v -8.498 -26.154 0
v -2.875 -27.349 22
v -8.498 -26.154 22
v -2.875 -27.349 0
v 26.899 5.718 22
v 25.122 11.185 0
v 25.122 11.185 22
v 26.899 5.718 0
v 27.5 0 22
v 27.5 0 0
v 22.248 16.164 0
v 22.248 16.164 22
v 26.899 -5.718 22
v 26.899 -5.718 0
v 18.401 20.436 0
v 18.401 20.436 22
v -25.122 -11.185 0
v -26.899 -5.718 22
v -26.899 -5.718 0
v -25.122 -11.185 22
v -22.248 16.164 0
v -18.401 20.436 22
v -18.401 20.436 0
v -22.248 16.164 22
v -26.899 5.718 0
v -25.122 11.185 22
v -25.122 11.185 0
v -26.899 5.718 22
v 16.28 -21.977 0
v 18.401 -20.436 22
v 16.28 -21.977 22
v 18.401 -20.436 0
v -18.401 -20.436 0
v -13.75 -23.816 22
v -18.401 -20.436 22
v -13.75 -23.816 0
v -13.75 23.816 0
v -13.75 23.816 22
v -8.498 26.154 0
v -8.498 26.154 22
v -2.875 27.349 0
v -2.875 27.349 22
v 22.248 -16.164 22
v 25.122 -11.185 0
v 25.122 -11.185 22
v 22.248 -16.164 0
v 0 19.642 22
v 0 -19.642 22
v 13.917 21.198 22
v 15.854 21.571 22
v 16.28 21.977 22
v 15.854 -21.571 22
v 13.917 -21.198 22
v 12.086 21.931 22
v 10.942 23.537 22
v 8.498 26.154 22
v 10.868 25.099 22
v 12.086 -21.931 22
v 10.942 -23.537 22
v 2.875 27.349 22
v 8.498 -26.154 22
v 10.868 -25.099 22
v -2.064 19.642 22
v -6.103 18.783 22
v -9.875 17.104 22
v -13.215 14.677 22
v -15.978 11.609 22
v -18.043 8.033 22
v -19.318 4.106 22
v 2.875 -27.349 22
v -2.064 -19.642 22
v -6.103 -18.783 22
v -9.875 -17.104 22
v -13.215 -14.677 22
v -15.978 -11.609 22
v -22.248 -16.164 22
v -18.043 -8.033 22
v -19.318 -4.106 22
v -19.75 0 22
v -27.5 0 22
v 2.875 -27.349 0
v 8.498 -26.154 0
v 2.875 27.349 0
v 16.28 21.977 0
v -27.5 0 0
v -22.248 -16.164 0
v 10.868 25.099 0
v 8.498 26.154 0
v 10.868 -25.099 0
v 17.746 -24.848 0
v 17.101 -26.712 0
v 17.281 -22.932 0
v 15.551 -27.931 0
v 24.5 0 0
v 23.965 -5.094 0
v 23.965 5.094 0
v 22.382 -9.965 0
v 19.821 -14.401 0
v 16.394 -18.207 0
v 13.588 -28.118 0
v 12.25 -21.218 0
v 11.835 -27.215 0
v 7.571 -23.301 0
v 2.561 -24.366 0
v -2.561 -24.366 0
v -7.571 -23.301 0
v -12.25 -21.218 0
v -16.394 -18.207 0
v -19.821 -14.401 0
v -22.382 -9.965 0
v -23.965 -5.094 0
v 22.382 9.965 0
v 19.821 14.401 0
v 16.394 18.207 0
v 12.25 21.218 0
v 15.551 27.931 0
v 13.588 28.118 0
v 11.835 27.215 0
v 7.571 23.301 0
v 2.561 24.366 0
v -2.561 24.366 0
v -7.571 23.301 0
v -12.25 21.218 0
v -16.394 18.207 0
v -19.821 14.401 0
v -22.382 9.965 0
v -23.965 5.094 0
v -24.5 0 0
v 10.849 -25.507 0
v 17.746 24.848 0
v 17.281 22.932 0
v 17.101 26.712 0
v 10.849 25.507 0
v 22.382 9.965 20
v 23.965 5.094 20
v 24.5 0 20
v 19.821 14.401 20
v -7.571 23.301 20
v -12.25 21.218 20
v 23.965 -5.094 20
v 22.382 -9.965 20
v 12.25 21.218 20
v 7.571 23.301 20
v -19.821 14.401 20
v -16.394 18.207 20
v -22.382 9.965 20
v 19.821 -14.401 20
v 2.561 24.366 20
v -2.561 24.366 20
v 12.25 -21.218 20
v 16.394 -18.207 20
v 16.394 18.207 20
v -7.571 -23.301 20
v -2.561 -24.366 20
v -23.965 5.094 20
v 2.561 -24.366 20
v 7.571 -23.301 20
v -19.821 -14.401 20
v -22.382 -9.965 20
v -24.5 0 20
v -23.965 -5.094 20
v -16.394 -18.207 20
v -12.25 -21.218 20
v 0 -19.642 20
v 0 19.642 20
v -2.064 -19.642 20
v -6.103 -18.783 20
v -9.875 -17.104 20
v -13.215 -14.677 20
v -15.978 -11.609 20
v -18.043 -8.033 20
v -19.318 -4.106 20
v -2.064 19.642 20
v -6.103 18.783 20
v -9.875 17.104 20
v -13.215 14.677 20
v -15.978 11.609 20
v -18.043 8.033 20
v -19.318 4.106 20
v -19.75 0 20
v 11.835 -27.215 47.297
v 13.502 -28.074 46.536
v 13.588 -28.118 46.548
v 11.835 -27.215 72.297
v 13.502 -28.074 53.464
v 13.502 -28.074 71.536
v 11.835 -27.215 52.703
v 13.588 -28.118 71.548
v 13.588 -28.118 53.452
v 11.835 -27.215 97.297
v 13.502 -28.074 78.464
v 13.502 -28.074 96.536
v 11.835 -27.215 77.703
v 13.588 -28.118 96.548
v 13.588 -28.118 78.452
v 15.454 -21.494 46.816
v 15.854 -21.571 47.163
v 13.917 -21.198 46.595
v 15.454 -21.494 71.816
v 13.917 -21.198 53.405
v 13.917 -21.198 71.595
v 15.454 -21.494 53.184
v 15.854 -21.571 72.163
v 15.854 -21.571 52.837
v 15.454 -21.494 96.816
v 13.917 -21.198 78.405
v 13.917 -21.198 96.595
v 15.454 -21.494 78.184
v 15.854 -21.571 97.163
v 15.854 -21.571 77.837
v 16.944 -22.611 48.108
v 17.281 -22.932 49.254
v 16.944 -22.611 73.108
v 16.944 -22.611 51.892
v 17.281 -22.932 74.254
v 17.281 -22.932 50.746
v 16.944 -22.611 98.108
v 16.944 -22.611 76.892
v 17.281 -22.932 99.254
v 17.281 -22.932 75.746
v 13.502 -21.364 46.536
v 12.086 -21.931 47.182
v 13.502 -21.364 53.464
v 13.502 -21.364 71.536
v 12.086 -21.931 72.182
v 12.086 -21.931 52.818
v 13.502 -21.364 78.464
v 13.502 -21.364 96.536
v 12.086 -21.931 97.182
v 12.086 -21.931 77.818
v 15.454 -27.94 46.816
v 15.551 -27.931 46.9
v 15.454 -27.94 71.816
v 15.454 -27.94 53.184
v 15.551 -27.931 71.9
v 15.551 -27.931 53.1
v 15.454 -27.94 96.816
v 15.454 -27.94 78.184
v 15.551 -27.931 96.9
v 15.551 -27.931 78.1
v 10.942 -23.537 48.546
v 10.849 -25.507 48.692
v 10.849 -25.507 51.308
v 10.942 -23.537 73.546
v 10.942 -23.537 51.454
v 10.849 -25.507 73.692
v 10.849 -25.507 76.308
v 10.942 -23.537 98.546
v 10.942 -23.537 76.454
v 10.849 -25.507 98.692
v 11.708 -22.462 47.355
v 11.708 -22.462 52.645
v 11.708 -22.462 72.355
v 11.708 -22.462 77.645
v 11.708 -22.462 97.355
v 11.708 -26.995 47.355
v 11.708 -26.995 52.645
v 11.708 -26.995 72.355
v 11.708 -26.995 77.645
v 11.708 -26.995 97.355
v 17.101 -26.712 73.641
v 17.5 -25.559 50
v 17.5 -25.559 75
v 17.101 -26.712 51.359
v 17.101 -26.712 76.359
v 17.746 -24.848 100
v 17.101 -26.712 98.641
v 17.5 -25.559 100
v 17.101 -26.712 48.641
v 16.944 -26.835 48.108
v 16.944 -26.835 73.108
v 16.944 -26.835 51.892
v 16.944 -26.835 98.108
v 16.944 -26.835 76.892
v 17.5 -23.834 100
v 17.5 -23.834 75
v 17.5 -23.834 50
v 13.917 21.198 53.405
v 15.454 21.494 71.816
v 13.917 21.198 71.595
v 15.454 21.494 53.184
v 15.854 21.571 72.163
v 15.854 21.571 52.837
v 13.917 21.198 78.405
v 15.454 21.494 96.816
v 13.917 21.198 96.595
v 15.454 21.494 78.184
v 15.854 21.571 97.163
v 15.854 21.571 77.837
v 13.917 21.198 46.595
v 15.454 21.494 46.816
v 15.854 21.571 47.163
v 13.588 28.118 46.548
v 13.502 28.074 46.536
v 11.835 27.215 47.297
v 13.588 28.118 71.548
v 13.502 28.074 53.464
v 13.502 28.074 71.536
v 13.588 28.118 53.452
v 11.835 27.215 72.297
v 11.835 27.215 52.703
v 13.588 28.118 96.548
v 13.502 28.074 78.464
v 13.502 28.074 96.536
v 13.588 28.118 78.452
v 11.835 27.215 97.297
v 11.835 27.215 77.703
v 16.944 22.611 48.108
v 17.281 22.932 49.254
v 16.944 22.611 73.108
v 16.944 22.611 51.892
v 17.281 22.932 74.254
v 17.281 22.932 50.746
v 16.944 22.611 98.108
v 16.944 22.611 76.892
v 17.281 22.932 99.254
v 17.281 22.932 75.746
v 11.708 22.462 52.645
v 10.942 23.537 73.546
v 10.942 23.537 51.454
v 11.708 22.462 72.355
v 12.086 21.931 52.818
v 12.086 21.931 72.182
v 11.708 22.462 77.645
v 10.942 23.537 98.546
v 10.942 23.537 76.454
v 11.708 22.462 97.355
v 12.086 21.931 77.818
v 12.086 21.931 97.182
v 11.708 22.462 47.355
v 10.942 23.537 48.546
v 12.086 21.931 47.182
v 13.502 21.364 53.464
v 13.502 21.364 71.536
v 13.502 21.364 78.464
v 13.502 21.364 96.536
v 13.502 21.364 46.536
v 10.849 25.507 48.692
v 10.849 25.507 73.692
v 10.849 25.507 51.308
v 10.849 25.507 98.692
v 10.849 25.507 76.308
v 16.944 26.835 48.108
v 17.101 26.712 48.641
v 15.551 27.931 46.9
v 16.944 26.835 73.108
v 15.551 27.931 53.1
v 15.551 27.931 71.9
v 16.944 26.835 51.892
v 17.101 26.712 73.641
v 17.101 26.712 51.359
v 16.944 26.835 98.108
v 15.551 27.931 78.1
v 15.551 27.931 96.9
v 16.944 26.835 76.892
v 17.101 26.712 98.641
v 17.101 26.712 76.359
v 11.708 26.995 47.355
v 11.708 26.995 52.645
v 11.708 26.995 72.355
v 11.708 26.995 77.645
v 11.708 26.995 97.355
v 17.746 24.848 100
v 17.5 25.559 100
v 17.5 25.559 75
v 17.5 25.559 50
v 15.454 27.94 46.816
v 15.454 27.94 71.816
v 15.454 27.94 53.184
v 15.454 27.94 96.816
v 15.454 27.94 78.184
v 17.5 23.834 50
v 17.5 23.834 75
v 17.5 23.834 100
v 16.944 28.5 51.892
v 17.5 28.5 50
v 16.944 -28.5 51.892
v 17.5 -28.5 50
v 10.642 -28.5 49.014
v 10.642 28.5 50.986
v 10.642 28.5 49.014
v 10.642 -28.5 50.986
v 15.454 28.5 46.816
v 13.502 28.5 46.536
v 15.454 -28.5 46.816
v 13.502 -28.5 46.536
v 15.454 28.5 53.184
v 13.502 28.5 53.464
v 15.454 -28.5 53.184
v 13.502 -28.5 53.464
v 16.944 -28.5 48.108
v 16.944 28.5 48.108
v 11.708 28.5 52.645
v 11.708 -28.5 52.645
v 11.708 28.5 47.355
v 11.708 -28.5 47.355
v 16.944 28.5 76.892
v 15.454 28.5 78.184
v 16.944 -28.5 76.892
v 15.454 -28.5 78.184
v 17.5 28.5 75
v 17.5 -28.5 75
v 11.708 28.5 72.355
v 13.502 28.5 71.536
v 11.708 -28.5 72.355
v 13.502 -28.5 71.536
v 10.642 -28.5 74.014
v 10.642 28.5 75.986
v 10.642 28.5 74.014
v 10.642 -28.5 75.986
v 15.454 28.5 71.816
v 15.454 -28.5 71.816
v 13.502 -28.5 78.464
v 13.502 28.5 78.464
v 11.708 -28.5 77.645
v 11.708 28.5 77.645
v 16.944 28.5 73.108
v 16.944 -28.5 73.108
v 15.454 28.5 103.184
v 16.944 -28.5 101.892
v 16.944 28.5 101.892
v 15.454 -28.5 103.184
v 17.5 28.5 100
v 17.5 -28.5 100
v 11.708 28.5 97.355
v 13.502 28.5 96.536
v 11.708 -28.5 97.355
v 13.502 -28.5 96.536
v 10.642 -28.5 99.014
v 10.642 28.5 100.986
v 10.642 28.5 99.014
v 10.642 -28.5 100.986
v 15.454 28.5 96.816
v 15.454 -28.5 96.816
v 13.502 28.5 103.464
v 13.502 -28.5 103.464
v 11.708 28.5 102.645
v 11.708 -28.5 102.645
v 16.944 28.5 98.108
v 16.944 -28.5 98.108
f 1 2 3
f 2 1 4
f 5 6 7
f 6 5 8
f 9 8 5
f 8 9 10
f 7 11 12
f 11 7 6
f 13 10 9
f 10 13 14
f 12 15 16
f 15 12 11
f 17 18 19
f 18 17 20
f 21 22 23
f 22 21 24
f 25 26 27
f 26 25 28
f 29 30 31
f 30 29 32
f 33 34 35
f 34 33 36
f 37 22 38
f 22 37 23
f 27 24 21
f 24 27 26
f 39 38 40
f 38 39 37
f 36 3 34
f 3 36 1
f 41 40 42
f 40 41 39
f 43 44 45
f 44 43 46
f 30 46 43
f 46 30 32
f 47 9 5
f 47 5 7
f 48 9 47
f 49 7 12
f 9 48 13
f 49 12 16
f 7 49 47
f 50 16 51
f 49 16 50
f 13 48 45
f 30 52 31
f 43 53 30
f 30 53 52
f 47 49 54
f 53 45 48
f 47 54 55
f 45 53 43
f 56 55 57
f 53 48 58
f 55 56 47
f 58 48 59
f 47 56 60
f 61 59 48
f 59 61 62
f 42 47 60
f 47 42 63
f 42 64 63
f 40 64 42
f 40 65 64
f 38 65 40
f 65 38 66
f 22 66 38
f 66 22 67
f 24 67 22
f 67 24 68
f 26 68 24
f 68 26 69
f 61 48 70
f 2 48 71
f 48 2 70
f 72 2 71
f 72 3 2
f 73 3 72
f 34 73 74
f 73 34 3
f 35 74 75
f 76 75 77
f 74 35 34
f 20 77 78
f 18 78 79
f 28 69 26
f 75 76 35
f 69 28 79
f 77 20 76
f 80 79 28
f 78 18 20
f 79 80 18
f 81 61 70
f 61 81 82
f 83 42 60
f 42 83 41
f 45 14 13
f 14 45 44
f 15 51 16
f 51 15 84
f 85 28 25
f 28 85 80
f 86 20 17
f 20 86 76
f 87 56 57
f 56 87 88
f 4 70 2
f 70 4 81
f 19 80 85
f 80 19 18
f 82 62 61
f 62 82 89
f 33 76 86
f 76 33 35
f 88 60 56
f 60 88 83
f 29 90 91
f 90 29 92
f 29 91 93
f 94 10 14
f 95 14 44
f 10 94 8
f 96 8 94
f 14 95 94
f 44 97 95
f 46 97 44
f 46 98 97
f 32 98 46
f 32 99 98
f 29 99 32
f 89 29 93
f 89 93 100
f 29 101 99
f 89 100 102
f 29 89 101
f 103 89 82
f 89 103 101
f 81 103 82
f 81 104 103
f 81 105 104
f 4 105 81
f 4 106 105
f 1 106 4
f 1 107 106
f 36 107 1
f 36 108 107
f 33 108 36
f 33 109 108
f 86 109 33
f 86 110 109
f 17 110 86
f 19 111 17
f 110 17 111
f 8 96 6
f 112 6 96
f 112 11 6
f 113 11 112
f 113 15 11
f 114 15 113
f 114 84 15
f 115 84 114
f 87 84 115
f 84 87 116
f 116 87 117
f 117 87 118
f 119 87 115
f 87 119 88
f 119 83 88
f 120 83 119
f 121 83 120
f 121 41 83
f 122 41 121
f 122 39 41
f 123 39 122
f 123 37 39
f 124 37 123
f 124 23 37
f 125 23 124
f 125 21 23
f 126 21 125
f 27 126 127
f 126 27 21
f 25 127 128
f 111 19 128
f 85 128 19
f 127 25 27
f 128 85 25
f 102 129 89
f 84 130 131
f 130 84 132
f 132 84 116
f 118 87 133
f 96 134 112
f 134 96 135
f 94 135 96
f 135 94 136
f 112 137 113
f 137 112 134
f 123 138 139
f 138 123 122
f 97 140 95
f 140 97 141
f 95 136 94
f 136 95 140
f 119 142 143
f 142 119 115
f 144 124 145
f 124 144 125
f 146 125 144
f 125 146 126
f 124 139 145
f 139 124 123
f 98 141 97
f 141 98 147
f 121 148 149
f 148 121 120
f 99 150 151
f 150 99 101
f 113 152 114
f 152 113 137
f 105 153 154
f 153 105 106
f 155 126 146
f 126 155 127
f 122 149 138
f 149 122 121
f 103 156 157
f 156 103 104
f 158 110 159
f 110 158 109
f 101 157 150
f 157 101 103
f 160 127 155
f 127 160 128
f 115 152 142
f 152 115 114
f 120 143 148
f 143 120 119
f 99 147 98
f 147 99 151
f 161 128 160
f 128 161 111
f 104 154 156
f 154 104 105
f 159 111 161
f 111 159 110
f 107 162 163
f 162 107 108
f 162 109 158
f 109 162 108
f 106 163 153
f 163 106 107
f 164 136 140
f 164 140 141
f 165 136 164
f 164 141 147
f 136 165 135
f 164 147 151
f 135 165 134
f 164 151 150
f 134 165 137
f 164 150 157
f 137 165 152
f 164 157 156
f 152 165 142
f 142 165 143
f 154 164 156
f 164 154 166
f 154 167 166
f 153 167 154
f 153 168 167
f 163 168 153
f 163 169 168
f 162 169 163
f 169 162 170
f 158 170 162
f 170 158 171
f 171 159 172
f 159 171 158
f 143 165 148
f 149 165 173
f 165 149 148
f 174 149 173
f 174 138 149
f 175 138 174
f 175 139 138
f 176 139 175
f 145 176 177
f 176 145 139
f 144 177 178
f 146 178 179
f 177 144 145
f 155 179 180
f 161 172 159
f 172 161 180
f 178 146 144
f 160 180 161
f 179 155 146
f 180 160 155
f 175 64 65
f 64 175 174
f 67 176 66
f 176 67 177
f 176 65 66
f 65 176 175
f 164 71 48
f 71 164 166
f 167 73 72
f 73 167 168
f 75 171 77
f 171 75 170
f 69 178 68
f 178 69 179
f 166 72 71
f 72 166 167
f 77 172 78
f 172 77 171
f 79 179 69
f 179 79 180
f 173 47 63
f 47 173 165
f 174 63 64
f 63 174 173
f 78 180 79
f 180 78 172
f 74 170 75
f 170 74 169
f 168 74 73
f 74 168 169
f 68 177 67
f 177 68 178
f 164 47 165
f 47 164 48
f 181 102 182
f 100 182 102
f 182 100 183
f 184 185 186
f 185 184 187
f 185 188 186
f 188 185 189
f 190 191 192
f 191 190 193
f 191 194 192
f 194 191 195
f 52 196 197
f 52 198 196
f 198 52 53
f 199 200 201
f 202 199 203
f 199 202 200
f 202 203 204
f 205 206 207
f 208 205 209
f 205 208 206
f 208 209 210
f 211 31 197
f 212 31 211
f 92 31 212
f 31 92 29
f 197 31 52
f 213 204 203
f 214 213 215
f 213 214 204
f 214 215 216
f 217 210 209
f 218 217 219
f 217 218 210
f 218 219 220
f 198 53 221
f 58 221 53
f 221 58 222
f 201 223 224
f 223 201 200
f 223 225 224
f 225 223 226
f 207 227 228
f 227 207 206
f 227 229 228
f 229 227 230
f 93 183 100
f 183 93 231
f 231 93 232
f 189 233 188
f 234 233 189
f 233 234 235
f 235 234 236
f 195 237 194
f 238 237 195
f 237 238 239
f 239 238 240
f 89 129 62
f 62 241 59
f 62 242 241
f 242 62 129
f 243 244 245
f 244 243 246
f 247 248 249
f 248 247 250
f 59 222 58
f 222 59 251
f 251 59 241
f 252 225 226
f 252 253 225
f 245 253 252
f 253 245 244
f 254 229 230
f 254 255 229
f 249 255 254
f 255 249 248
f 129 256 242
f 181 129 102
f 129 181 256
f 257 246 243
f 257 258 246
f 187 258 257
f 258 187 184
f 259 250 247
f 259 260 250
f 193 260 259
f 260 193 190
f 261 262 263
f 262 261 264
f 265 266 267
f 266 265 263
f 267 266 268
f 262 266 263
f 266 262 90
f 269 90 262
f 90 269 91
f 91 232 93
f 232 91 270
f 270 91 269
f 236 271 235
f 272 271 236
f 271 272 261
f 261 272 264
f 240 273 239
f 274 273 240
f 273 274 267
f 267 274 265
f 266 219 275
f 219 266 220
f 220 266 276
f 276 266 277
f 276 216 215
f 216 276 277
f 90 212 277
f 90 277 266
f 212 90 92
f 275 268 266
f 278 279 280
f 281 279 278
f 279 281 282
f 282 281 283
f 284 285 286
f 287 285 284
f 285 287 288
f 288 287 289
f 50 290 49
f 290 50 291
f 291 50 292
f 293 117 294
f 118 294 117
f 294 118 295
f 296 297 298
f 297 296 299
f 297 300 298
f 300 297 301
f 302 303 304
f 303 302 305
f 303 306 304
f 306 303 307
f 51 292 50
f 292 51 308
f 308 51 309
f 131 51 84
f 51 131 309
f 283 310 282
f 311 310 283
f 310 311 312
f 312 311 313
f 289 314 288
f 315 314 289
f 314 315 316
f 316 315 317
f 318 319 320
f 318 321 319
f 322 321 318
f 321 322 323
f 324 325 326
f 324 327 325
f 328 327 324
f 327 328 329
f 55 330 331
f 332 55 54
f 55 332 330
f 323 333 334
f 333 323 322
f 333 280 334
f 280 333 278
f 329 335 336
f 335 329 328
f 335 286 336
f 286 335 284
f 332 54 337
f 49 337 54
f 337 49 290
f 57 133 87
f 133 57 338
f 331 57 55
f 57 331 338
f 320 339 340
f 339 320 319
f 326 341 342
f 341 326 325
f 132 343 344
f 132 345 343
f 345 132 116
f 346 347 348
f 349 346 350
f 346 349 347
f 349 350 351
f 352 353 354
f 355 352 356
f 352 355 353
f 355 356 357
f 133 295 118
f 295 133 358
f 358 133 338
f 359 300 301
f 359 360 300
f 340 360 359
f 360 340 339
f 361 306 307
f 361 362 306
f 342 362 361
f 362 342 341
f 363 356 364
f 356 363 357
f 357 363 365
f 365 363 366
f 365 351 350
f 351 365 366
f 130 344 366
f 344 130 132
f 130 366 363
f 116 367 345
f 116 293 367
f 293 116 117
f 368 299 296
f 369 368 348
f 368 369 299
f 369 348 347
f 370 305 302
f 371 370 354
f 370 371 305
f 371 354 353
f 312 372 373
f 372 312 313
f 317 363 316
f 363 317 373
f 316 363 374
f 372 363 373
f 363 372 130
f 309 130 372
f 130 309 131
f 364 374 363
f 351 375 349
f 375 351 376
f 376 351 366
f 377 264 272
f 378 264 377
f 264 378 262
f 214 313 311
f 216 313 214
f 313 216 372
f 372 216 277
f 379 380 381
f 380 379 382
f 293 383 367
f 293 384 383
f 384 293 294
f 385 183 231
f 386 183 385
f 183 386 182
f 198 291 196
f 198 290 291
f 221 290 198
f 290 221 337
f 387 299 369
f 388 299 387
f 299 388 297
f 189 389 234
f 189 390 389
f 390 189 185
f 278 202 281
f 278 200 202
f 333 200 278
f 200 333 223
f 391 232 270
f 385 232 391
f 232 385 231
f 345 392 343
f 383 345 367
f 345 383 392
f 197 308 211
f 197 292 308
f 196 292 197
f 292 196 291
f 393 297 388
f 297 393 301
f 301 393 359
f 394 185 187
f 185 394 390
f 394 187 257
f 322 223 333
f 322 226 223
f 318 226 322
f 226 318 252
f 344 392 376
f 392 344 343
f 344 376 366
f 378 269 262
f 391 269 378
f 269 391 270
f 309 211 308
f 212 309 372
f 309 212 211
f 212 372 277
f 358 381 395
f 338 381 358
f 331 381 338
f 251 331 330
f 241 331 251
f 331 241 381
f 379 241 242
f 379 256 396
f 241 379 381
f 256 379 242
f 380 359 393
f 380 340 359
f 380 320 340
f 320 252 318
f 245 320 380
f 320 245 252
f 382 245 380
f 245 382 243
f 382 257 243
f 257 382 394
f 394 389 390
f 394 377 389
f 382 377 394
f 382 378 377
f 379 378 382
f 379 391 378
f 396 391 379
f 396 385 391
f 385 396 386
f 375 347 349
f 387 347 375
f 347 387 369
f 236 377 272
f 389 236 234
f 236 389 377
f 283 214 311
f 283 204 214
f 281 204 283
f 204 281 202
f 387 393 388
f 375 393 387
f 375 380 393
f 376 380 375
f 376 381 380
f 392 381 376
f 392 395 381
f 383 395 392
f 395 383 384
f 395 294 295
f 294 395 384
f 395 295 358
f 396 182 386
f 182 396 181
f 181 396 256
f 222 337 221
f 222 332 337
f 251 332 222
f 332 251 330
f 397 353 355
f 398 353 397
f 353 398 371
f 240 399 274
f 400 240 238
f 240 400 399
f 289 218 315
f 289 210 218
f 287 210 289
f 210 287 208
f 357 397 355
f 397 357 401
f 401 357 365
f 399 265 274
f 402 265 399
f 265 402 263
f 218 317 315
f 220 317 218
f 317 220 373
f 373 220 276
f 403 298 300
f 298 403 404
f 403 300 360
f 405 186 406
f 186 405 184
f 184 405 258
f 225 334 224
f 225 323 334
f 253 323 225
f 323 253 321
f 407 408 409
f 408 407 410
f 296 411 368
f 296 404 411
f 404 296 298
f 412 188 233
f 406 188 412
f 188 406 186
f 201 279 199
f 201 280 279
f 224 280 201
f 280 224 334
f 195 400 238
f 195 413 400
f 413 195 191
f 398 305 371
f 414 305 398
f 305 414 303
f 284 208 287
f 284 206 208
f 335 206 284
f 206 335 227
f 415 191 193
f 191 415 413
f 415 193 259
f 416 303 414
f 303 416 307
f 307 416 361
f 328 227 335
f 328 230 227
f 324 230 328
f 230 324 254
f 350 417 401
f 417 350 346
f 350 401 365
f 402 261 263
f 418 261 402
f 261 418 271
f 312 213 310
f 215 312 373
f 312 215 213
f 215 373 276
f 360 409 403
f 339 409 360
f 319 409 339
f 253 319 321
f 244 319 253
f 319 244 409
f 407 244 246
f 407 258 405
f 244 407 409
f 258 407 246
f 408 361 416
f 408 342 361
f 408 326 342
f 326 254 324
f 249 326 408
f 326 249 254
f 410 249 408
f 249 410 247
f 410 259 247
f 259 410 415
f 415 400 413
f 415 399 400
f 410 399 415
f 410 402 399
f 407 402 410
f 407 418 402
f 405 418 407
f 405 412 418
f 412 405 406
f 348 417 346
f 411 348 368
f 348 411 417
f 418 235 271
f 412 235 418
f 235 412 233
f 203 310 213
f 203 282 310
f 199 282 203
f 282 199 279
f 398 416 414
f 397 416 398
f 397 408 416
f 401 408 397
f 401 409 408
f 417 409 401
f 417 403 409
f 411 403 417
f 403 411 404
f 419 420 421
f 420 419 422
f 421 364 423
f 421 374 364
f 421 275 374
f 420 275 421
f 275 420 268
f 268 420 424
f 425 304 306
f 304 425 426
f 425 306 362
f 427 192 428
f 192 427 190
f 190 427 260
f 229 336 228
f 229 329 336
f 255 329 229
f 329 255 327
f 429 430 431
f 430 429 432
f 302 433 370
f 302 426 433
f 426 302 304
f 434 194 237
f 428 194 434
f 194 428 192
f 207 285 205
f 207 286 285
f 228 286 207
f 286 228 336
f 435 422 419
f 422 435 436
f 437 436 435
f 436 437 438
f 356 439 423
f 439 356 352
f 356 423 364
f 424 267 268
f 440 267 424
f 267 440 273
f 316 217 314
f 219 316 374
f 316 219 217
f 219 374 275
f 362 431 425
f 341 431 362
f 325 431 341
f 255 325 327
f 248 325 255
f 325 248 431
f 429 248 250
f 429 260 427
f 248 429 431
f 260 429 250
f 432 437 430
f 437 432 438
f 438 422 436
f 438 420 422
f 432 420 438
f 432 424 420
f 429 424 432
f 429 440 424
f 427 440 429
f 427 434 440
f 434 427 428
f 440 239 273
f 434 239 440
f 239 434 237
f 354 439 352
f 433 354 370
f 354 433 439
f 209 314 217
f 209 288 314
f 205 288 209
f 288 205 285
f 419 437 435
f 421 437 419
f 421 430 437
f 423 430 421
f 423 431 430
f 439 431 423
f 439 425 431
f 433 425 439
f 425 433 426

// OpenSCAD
module PerchSupport() {
  cylinder(100, 3.5, 3.5, false);
}

module PerchSupportAtEdgeOfTube() {
  // rotate it around the z-axis.
  rotate([0,0,30]) {
    // move the perch support to the outside of the tube.
    translate([0,-28.5,0]) {
      PerchSupport(){};
    };
  };
};

module Perch(distance_up_from_xy_plane) {
  translate([14,0,distance_up_from_xy_plane]) {
    rotate([90,0,0]) {
      cylinder(57, 3.5, 3.5, true);
    };
  };
};

union() {

  // outer tube that goes around the outside of the bottom opening of the PVC pipe
  difference(){
    // outer cylinder
    cylinder(22, 27.5, 27.5, false);
    // have the inner cylinder extend 1 unit in each direction along the
    // z-axis in order to extend beyond the ends of the outer cylinder.
    // this will leave no ambiguity about whether the ends of the tube should
    // be open or closed.
    translate([0,0,-1]) {
      // inner cylinder that gets subtracted from the outer cylinder
      cylinder(24, 24.5, 24.5, false);
    }
  };

  // translate it up the z-axis to the top of the outer cylinders.
  translate([0,0,20]) {
    difference() {
      // disk with a hole in the middle that joins the outer tube and
      // inner tube that go around the outside and inside, respectively,
      // of the bottom of the PVC pipe.
      cylinder(2, 27.5, 27.5, false);
      translate([0,0,-1]) {
        cylinder(4, 19.75, 19.75, false);
      }
    }
  };

  intersection() {
    // face that covers half of the opening.
    translate([0,0,21]) {
      // move it down the x-axis so that it reveals half of the tube opening.
      translate([13.75, 0, 0]) {
        // create a rectangle that will obscure half of the tube opening,
        // centered on the origin.
        cube([27.5, 55, 2], true);
      }
    };
    // cylinder with a radius equal to that of the outer tube, for the
    // purpose of trimming off the parts of the tube face that extend
    // beyond the radius of the outer tube.
    cylinder(25, 27.5, 27.5, false);
  };

  // the two perch supports that extend parallel to the axis of the
  // tube opening.
  PerchSupportAtEdgeOfTube();
  mirror([0,1,0]) {
    PerchSupportAtEdgeOfTube();
  };

  // Perches
  Perch(50);
  Perch(75);
  Perch(100);

}
